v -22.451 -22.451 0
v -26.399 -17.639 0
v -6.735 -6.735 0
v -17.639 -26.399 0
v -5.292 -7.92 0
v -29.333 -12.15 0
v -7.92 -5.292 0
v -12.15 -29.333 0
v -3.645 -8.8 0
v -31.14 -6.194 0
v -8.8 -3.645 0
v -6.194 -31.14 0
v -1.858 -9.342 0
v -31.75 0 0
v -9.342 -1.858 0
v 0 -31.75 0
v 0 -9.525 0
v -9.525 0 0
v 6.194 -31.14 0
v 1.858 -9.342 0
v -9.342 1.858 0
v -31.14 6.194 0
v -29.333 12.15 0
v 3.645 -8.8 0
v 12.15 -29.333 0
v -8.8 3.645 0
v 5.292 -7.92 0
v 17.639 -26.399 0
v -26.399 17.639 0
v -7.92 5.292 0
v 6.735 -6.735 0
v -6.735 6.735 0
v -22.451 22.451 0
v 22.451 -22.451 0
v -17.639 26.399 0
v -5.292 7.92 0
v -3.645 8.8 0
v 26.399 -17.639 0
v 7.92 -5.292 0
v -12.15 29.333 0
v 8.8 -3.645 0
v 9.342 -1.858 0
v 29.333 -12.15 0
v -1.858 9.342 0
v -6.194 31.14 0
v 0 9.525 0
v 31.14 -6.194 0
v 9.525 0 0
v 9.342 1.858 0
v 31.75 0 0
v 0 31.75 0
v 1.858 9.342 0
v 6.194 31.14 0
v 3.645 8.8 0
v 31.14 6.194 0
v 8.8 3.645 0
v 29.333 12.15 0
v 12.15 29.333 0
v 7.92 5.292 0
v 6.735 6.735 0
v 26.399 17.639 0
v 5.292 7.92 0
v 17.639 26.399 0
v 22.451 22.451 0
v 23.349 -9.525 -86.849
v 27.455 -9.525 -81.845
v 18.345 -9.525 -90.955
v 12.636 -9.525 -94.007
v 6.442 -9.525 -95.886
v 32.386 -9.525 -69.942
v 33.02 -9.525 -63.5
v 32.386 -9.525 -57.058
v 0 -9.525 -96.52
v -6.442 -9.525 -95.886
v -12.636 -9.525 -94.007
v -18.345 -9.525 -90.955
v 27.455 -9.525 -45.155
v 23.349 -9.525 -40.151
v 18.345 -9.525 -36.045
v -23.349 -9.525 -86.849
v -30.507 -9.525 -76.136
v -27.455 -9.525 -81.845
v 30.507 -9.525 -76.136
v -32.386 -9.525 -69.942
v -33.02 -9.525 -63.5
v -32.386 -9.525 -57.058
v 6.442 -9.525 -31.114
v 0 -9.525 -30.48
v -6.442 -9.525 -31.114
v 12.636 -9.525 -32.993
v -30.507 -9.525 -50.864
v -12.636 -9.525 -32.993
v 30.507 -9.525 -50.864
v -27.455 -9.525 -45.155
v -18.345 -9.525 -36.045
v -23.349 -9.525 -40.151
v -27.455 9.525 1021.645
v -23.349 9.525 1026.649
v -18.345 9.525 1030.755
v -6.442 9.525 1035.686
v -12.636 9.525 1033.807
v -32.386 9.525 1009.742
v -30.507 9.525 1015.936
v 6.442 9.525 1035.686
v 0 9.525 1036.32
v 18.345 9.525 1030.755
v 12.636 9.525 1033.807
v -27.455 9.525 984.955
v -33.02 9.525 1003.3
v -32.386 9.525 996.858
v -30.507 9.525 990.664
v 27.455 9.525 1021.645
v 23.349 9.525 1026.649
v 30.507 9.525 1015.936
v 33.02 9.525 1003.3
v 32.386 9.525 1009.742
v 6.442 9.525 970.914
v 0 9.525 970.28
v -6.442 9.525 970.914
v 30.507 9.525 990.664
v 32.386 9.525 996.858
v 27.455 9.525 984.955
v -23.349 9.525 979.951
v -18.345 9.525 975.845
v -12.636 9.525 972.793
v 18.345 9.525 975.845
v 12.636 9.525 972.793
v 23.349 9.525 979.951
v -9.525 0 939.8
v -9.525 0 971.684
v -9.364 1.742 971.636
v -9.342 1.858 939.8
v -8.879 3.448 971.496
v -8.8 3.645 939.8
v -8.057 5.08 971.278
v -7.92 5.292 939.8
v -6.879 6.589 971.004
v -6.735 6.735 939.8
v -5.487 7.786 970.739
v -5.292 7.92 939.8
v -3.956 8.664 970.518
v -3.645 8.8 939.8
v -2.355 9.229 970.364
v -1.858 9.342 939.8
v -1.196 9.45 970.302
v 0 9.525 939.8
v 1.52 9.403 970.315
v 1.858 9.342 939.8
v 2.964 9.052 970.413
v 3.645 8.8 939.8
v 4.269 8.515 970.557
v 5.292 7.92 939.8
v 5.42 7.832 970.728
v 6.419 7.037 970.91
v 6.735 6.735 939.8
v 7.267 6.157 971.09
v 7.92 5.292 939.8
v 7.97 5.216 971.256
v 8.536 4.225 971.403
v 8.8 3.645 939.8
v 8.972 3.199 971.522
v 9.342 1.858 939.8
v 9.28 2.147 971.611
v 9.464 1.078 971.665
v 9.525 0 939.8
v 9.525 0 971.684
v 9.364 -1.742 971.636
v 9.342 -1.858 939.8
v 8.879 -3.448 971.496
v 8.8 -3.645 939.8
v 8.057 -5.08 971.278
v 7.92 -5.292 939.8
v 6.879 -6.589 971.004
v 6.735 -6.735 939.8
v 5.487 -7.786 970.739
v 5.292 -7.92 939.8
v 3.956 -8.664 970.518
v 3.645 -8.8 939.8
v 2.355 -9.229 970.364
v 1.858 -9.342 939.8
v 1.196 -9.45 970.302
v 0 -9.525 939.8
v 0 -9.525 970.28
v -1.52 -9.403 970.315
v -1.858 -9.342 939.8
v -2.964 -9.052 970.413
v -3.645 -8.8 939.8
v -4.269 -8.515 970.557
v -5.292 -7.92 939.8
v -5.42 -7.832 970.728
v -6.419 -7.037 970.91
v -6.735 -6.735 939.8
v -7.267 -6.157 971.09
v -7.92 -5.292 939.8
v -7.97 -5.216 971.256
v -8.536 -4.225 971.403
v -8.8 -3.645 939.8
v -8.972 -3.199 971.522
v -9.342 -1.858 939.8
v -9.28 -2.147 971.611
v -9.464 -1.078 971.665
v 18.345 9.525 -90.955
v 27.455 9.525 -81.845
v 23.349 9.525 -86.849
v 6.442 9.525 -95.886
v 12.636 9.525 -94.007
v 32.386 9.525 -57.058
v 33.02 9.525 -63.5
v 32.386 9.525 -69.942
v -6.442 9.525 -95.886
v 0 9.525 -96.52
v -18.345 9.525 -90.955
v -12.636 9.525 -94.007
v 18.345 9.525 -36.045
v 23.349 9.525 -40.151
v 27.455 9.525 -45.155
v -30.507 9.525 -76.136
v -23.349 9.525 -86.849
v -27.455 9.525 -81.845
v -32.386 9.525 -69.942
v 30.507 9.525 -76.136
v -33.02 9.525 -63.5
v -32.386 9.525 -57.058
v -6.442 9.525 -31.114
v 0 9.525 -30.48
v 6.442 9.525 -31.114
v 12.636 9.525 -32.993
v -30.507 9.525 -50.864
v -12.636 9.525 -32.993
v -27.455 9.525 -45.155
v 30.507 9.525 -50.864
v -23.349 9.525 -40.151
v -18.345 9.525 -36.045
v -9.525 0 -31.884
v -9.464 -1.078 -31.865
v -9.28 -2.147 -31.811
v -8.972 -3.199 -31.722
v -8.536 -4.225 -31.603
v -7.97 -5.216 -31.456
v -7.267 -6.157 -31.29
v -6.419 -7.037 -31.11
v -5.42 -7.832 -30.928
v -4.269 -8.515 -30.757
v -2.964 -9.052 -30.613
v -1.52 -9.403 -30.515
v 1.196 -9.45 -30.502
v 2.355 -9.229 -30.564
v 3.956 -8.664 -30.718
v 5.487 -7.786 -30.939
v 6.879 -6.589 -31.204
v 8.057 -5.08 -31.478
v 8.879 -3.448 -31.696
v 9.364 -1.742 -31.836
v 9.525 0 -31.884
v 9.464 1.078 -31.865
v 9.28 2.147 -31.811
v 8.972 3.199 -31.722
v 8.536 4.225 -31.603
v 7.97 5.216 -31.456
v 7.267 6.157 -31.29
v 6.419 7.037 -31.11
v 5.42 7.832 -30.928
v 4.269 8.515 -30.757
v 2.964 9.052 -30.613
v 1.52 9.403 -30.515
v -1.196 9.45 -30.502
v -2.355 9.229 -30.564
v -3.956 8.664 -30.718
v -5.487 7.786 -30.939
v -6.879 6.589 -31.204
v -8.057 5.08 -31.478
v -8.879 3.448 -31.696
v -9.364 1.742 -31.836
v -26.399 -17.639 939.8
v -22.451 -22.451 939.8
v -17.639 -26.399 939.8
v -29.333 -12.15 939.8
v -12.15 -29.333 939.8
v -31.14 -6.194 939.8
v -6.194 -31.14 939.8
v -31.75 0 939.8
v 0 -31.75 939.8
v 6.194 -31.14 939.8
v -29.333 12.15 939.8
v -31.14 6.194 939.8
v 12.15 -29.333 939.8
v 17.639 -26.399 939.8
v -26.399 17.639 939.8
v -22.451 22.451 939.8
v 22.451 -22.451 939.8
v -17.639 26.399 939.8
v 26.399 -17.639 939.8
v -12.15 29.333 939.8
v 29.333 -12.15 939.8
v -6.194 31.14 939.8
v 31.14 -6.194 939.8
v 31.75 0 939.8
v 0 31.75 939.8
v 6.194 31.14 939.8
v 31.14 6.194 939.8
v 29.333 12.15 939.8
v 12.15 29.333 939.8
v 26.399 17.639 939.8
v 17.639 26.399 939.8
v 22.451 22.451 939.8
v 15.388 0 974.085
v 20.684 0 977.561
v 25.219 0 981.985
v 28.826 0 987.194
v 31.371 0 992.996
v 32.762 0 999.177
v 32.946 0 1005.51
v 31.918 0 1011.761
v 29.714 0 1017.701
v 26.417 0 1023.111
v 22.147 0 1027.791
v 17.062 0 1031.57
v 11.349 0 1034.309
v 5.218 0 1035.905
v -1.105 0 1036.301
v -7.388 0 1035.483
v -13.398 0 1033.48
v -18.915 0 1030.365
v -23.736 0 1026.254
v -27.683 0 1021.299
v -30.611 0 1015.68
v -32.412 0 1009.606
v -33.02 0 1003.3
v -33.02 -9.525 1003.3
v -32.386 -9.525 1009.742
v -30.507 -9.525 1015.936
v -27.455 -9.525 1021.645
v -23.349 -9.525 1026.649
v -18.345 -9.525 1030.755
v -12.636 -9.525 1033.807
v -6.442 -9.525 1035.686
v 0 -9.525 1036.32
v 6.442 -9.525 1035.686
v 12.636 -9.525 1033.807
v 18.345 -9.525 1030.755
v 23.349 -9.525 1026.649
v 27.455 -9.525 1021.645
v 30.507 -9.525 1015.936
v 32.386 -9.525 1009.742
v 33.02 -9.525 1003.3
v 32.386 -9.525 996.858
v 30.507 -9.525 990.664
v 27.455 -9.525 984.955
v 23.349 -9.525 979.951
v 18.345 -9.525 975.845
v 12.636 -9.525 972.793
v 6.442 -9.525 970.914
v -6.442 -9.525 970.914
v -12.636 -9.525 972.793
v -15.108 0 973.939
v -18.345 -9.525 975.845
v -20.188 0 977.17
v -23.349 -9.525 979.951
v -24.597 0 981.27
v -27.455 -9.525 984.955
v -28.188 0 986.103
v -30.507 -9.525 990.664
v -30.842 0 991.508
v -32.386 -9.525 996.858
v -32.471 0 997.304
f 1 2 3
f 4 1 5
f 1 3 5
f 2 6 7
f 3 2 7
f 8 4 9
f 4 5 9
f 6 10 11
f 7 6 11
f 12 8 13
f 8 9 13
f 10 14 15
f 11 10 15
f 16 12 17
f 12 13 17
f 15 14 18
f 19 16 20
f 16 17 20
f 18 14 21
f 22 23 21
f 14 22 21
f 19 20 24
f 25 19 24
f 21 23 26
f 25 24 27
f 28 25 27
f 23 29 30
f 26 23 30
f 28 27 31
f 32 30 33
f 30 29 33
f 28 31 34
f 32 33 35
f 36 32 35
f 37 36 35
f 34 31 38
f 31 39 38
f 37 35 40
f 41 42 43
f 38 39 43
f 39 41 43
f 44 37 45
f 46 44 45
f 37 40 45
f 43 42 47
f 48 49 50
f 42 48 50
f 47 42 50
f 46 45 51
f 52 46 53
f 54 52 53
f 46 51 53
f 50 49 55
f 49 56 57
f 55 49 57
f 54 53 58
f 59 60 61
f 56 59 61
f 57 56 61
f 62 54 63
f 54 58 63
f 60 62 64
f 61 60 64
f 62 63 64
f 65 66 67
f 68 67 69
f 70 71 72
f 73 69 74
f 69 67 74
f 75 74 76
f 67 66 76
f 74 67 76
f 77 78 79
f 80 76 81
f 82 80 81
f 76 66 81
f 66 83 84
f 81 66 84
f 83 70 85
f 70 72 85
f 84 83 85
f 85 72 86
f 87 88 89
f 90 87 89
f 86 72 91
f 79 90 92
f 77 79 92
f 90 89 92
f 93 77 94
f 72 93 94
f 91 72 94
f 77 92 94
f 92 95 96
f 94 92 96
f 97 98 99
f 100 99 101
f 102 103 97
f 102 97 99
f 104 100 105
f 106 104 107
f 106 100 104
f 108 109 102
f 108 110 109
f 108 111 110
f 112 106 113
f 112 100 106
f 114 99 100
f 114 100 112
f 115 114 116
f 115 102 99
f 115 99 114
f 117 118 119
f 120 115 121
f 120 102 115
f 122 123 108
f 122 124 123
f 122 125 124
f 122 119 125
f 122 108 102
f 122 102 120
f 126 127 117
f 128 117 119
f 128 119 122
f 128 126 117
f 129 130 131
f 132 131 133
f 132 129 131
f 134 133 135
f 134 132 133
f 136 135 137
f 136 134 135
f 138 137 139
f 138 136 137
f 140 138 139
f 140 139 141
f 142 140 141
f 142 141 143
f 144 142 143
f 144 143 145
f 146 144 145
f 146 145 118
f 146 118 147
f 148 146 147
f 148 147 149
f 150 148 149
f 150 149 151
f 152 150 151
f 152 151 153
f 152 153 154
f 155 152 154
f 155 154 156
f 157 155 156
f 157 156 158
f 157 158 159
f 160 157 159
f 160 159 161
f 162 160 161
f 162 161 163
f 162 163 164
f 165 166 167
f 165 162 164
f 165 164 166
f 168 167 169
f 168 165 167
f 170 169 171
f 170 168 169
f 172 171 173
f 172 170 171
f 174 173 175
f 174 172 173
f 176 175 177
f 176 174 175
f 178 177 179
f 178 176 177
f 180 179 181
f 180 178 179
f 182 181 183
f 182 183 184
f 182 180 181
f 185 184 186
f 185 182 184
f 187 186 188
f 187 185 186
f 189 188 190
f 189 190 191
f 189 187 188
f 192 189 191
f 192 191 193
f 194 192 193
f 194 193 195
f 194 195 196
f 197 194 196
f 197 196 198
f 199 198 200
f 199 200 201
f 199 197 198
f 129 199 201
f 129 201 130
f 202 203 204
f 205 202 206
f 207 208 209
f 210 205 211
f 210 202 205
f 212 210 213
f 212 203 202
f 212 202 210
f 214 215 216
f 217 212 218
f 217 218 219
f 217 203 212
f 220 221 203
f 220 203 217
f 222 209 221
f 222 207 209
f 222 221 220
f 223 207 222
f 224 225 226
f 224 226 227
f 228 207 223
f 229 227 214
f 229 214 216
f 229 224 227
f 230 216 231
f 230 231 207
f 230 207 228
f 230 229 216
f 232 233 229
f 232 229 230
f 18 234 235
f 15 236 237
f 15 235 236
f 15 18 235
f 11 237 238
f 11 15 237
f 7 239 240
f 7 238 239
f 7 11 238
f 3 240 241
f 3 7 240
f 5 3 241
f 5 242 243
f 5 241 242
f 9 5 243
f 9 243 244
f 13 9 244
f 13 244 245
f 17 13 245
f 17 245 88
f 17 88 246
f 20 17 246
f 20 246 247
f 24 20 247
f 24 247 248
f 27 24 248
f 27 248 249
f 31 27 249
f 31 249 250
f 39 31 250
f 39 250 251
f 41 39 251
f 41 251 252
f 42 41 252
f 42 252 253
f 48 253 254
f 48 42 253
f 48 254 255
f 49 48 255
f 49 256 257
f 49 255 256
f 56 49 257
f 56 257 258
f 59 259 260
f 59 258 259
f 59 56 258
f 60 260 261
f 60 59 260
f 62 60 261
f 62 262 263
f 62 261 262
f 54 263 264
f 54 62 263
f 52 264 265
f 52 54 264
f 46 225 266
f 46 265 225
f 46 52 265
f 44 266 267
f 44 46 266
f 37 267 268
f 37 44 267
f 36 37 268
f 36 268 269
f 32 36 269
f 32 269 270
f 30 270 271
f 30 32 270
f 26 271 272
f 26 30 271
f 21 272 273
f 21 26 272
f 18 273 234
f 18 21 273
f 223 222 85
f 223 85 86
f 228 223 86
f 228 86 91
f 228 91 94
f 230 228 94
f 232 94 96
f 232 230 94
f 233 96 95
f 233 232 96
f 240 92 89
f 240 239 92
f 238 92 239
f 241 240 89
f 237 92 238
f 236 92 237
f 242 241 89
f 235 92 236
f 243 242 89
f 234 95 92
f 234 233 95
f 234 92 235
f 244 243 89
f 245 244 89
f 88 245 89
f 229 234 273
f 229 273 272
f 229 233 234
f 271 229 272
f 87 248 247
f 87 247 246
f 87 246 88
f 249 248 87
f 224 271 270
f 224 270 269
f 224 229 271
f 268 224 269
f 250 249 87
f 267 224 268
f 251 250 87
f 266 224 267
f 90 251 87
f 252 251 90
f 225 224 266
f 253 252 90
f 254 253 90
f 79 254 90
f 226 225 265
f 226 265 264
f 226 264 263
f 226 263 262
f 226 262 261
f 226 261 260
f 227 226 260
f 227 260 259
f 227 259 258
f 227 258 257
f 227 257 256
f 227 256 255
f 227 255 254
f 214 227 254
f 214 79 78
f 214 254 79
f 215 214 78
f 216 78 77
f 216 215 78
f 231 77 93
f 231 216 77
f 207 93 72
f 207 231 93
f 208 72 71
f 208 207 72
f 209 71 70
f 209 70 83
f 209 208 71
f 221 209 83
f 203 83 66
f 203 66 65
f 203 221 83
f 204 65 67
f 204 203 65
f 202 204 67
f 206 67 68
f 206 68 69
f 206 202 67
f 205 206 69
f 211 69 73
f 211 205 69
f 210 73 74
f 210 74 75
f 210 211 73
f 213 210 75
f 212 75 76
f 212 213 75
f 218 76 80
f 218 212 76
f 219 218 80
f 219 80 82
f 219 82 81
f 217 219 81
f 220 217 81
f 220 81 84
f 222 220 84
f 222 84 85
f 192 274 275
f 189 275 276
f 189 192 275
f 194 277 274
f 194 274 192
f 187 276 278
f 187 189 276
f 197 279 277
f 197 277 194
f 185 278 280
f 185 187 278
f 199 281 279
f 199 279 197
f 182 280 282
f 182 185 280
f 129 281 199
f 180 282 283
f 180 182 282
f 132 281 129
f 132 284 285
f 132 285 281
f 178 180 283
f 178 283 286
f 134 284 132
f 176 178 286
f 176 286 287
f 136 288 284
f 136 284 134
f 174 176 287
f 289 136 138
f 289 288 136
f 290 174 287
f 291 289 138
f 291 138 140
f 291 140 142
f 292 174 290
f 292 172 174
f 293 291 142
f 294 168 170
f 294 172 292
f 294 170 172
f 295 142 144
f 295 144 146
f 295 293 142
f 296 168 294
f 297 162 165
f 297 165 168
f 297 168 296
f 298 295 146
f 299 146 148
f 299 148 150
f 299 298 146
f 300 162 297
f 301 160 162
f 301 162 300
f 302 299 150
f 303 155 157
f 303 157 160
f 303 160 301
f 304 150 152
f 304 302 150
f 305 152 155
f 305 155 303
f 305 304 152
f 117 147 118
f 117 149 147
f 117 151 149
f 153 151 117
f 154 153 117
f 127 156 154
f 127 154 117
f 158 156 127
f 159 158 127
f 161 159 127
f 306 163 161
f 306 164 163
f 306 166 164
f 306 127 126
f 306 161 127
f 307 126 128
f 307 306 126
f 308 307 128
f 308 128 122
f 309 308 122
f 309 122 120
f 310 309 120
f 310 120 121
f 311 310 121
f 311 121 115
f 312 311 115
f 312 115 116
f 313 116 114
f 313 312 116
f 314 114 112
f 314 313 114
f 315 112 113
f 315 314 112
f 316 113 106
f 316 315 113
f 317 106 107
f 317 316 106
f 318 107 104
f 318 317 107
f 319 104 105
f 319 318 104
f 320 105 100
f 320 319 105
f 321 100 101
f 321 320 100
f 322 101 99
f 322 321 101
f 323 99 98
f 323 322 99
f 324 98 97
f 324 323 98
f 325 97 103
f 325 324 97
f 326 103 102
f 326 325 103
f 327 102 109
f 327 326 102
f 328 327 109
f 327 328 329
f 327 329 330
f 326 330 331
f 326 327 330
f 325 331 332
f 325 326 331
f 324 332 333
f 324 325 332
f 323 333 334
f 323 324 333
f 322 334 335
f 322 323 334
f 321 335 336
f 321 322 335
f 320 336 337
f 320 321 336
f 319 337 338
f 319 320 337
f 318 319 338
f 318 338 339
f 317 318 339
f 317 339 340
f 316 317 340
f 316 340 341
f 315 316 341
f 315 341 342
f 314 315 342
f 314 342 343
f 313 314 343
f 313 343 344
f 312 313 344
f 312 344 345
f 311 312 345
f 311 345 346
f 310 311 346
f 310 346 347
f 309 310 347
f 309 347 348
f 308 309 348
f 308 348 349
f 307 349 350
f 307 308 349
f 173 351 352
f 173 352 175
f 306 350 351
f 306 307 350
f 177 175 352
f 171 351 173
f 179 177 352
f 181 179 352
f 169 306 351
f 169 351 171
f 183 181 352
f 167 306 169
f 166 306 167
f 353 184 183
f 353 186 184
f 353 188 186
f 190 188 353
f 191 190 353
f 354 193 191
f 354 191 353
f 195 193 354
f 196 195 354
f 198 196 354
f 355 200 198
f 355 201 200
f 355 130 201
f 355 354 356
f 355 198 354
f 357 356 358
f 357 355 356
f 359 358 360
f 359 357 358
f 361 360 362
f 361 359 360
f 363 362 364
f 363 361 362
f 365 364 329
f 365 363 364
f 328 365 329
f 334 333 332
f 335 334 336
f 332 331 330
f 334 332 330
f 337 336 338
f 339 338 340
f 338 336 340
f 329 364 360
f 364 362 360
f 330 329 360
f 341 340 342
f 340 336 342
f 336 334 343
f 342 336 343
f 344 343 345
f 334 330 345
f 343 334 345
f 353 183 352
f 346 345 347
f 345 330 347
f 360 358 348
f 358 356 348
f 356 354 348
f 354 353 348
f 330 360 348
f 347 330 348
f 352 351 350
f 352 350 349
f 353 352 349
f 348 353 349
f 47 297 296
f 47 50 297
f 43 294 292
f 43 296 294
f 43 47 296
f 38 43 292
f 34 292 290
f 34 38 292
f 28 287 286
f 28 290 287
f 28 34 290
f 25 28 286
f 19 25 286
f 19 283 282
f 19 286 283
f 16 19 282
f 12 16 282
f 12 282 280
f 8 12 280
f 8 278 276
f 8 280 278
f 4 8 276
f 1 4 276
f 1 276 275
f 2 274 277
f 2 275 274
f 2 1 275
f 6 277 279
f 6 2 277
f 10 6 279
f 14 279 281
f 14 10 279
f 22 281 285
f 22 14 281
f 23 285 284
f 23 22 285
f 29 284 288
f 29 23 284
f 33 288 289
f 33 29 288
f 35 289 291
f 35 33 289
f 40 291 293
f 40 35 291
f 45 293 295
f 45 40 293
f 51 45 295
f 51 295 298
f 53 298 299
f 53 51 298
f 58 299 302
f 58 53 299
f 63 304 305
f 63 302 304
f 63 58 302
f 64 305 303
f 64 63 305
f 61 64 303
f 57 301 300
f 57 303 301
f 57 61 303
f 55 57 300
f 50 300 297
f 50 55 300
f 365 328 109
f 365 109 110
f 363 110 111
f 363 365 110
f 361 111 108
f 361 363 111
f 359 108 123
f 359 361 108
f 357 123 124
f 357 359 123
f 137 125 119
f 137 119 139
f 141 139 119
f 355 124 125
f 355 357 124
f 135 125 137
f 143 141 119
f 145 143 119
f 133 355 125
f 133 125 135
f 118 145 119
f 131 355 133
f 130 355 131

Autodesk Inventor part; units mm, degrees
ref_plane "YZ Plane" through (0, 0, 0) normal (1, 0, 0) x (0, 1, 0)
ref_plane "XZ Plane" through (0, 0, 0) normal (0, 1, 0) x (-1, 0, 0)
sketch "Sketch1" plane through (0, 0, 0) normal (0, 0, 1) x (1, 0, 0)
  circle A0 centre (0, 0) radius 31.75
  dimension "d0" = 63.5
extrude "Extrusion1" add sketch "Sketch1" along normal blind 939.8
sketch "Sketch2" plane through (0, 0, 0) normal (0, 0, -1) x (-1, 0, 0)
  circle A0 centre (0, 0) radius 9.525
  dimension "d3" = 19.05
extrude "Extrusion2" add sketch "Sketch2" along normal blind 50.8
sketch "Sketch3" plane through (0, 0, 0) normal (0, 1, 0) x (-1, 0, 0)
  circle A0 centre (0, -63.5) radius 33.02
  line L0 (31.75, 0) -> (-31.75, 0) construction
  point P0 (0, 0)
  dimension "d6" = 66.04
  dimension "d7" = 63.5
extrude "Extrusion3" add sketch "Sketch3" along normal mid plane 19.05
ref_plane "Work Plane1" through (0, 0, 469.9) normal (0, 0, 1) x (1, 0, 0)
mirror "Mirror1" about plane through (0, 0, 469.9) normal (0, 0, 1) of "Extrusion2", "Extrusion3"
properties part number "transmission_box_mount_shaft"
